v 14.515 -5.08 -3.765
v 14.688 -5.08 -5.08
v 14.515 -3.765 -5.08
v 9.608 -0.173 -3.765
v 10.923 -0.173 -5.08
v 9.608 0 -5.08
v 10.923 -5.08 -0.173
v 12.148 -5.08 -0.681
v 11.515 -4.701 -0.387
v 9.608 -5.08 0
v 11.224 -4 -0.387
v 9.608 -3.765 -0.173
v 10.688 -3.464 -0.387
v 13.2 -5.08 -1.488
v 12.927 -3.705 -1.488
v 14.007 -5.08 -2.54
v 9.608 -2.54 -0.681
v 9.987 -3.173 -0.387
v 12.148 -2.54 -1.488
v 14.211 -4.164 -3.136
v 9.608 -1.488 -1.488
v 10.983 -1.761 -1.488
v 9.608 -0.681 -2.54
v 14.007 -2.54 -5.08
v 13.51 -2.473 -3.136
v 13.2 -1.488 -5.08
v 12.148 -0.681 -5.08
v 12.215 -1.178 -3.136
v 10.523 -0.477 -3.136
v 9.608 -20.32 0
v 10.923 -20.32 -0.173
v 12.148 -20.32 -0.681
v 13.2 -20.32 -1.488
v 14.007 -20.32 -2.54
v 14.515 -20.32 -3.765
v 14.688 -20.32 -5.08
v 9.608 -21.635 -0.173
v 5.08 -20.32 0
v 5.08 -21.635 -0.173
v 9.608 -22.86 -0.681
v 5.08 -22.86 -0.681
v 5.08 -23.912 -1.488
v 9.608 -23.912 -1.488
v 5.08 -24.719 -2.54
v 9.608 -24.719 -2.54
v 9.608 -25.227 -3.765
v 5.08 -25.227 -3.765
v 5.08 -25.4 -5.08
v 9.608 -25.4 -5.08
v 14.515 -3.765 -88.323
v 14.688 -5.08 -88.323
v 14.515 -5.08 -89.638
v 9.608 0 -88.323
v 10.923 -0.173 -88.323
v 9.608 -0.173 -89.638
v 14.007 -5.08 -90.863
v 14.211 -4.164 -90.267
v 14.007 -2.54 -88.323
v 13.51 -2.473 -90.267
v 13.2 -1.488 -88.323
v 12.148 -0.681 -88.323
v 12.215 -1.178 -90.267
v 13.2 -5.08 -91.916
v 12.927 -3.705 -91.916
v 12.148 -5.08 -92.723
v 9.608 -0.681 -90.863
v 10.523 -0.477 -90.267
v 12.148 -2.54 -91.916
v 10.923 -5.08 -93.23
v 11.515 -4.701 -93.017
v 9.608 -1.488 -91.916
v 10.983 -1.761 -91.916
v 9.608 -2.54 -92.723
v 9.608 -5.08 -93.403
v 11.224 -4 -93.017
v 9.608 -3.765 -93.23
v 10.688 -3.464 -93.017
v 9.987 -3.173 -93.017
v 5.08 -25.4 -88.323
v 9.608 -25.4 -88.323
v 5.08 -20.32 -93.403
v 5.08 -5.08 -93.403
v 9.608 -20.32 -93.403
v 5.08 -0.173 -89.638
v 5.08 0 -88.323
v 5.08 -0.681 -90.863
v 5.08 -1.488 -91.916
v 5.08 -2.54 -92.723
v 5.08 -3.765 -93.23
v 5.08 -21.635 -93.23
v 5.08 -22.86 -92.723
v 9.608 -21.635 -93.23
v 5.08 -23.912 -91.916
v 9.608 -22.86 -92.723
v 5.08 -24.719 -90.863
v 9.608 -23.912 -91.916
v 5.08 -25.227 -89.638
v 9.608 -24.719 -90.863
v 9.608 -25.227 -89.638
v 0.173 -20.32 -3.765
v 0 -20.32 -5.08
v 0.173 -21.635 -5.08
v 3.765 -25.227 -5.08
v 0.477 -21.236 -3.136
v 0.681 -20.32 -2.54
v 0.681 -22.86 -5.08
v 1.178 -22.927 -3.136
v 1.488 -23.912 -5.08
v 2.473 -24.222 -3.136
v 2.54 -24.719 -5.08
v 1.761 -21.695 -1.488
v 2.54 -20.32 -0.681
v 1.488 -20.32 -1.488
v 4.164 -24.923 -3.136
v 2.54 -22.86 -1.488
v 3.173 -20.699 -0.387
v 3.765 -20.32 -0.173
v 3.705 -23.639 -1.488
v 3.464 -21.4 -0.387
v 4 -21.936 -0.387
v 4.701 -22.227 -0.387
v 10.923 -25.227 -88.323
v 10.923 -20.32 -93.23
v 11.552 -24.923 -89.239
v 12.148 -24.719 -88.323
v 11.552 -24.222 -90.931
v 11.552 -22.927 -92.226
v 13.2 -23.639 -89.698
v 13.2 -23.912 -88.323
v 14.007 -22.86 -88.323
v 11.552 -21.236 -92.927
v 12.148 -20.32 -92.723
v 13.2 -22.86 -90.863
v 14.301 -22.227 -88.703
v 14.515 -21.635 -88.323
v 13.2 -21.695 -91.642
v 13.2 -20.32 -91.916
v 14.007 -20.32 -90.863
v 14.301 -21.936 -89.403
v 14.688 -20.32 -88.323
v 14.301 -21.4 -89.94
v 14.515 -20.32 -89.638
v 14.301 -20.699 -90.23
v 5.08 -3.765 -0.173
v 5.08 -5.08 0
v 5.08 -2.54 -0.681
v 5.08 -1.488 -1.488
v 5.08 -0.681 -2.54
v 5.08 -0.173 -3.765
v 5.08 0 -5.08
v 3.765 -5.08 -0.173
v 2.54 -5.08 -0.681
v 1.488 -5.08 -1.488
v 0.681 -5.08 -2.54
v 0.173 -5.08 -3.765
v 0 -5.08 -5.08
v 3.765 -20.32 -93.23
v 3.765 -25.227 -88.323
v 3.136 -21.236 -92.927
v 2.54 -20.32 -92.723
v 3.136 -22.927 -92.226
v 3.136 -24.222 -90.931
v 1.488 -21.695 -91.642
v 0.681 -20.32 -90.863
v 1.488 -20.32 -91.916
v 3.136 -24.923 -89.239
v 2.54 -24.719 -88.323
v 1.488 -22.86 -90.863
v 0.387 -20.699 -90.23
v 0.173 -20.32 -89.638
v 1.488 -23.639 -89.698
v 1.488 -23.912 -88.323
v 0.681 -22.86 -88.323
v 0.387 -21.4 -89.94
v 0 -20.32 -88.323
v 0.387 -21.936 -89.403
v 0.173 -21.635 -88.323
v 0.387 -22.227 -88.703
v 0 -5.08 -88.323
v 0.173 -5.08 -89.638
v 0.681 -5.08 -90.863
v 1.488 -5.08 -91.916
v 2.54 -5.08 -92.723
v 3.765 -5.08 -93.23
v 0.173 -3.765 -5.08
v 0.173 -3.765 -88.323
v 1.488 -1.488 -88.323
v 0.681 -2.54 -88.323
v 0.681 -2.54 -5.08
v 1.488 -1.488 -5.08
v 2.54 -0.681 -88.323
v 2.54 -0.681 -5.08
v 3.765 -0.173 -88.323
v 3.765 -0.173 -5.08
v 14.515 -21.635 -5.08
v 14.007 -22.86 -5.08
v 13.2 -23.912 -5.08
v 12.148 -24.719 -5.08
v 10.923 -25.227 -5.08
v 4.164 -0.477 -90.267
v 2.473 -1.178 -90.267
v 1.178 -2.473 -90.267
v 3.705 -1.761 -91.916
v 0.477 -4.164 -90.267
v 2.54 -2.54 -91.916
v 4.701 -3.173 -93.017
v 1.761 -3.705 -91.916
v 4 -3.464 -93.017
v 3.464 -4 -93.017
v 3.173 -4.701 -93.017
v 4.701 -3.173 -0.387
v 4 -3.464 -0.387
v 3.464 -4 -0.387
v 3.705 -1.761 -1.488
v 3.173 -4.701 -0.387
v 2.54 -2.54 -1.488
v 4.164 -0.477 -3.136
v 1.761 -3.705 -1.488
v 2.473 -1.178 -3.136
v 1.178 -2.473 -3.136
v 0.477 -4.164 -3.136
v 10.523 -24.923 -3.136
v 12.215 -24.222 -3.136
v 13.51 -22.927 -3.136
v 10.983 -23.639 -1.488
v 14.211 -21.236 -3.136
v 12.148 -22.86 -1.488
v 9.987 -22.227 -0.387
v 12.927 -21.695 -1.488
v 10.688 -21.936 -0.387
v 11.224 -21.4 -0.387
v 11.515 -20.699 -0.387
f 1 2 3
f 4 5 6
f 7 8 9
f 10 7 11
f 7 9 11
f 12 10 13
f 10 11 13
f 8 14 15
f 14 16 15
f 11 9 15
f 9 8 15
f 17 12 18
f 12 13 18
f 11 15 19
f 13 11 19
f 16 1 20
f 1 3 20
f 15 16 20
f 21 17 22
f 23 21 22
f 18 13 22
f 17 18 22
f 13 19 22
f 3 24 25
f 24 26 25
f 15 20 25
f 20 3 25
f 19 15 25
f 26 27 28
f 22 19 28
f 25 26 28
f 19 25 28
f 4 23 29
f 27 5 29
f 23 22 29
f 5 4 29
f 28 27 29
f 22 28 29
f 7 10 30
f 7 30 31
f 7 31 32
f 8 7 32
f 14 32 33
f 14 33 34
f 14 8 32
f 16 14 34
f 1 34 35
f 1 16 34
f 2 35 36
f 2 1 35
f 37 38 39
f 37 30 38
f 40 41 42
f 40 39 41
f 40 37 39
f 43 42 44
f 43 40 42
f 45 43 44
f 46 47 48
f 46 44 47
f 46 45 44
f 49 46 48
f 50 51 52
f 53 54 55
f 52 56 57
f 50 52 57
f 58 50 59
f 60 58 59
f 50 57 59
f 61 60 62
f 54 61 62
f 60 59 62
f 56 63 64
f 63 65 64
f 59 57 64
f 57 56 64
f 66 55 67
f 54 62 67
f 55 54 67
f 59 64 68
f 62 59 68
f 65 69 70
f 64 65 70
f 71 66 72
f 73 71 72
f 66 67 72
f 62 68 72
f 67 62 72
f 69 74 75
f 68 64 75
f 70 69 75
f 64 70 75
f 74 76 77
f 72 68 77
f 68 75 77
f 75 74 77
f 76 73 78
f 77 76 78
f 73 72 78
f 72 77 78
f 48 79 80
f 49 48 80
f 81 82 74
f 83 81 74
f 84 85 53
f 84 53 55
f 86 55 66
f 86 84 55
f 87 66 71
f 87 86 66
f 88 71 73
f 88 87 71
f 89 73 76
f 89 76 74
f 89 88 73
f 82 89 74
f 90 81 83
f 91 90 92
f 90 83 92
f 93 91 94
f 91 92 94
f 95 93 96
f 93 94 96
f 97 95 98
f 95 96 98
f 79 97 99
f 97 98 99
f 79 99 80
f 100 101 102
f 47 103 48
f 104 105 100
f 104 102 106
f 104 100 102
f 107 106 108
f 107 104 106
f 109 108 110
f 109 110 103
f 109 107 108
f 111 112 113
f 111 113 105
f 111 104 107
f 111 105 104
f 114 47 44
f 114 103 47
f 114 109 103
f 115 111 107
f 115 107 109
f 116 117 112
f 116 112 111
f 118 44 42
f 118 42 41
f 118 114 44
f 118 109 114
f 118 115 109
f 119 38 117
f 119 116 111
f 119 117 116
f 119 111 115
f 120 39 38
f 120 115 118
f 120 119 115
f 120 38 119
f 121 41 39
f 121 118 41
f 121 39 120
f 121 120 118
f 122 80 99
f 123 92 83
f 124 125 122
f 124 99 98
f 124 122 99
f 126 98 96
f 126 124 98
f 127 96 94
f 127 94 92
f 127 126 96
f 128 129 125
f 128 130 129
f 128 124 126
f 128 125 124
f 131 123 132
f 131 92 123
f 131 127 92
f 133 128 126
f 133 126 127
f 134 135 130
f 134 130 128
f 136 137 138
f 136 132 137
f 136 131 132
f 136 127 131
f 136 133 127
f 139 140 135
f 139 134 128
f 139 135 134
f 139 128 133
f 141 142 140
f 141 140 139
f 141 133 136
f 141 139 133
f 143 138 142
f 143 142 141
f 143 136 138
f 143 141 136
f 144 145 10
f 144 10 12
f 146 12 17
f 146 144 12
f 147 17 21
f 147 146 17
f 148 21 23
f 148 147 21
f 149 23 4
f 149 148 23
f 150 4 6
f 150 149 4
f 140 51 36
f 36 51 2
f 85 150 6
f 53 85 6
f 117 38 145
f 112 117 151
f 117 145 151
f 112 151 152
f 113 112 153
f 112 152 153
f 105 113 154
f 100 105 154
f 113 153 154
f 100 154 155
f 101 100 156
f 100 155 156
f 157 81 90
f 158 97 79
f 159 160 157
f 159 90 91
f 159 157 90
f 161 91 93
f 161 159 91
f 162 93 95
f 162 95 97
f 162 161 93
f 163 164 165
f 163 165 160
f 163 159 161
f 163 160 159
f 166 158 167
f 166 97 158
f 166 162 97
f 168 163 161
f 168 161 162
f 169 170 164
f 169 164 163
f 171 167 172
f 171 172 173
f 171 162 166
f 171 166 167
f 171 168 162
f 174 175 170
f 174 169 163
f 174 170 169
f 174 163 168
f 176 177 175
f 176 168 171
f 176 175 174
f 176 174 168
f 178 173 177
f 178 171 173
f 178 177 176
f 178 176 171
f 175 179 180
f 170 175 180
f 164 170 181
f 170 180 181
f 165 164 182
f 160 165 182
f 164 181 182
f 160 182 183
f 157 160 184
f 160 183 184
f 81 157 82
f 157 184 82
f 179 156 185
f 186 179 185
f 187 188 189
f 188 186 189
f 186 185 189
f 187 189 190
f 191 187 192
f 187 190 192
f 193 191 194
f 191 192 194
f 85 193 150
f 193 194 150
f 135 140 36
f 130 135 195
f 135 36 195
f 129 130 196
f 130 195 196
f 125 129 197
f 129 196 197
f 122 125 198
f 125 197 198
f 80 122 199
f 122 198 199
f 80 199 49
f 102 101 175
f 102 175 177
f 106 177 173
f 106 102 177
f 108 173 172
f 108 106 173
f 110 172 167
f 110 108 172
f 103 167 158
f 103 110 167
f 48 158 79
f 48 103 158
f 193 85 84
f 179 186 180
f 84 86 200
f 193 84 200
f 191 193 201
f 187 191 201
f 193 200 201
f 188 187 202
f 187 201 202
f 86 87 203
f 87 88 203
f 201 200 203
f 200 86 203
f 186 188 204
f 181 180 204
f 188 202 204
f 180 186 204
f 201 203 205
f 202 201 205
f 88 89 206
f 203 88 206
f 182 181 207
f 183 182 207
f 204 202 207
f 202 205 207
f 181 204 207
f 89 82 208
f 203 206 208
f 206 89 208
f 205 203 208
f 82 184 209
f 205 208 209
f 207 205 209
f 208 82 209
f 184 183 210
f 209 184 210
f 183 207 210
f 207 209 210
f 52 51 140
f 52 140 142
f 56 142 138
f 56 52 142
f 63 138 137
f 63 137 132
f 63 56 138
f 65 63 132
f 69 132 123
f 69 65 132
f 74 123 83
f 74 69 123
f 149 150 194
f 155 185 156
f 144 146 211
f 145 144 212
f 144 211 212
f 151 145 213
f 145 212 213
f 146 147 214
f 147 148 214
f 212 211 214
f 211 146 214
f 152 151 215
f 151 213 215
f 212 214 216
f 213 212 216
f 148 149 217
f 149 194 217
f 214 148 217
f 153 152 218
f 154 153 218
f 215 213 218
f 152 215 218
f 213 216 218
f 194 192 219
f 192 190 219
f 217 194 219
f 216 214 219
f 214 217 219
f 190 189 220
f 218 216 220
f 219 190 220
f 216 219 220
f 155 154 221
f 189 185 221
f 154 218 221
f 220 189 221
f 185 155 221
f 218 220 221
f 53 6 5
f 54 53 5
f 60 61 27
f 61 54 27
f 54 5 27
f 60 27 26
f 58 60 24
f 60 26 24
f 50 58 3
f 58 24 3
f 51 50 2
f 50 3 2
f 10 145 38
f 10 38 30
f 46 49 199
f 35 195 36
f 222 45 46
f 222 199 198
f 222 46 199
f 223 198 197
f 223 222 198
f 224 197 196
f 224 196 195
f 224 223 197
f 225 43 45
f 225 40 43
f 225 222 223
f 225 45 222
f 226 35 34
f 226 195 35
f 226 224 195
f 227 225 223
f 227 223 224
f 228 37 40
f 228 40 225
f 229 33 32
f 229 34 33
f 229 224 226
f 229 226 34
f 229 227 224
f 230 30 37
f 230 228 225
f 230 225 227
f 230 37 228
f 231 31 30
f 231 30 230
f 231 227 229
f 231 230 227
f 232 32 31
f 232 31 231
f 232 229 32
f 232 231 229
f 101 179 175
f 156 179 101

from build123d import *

# Parameters (mm, degrees)
F0_W         = 14.6878659725
F0_H         = 93.4034362435
F1_DEPTH     = 25.4
F2_R         = 5.08
F3_R         = 5.08
F4_T1_DEPTH  = 4.5278659725
F4_T3_DEPTH  = 15.24
F4_S7_W      = 5.08
F4_S7_H      = 5.08
F4_T8_DEPTH  = 5.08
F4_S13_W     = 5.08
F4_S13_H     = 5.08
F4_T14_DEPTH = 5.08
F4_S19_W     = 5.08
F4_S19_H     = 5.08
F4_T20_DEPTH = 5.08
F4_S25_W     = 5.08
F4_S25_H     = 5.08
F4_T26_DEPTH = 5.08
F4_T30_ANGLE = 90
F4_T32_ANGLE = 90
F4_T34_ANGLE = 90
F4_T36_ANGLE = 90


# Not quite as in the source:
# - a fillet or chamfer that OpenCascade refuses, or shapes differently, is made with other operations: its cross-section is extruded or revolved along the edge and cut away or added


with BuildPart() as f1:
    # F0 (on Front) → F1 (new body)
    with BuildSketch(Plane.XZ):
        with Locations((7.3439329863, -46.7017181218)):
            Rectangle(F0_W, F0_H)
    extrude(amount=F1_DEPTH)

    # F2
    f2_edges = [f1.edges().sort_by_distance(p)[0] for p in [
        (14.687866, -25.4, -46.701718),
        (7.343933, -25.4, 0),
        (0, -25.4, -46.701718),
        (7.343933, -25.4, -93.403436),
    ]]
    fillet(f2_edges, radius=F2_R)

    # F3
    f3_edges = [f1.edges().sort_by_distance(p)[0] for p in [
        (14.687866, 0, -46.701718),
        (0, 0, -46.701718),
    ]]
    fillet(f3_edges, radius=F3_R)

    # F4: fillet of radius 5.08 on 2 edges, made by hand

    # F4_s2 → F4_t1 (cut)
    with BuildSketch(Plane.YZ.offset(5.08)):
        with BuildLine():
            ThreePointArc((0, -88.3234362435), (-1.4878975516, -91.915538692), (-5.08, -93.4034362435))
            Line((-5.08, -93.4034362435), (0, -93.4034362435))
            Line((0, -93.4034362435), (0, -88.3234362435))
        make_face()
        with BuildLine():
            ThreePointArc((-5.08, 0), (-1.4878975516, -1.4878975516), (0, -5.08))
            Line((0, -5.08), (0, 0))
            Line((0, 0), (-5.08, 0))
        make_face()
    extrude(amount=F4_T1_DEPTH, mode=Mode.SUBTRACT)

    # F4_s4 → F4_t3 (cut)
    with BuildSketch(Plane.XZ.offset(5.08)):
        with BuildLine():
            ThreePointArc((5.08, 0), (1.4878975516, -1.4878975516), (0, -5.08))
            Line((0, -5.08), (0, 0))
            Line((0, 0), (5.08, 0))
        make_face()
        with BuildLine():
            ThreePointArc((9.6078659725, 0), (13.1999684209, -1.4878975516), (14.6878659725, -5.08))
            Line((14.6878659725, -5.08), (14.6878659725, 0))
            Line((14.6878659725, 0), (9.6078659725, 0))
        make_face()
        with BuildLine():
            ThreePointArc((14.6878659725, -88.3234362435), (13.1999684209, -91.915538692), (9.6078659725, -93.4034362435))
            Line((9.6078659725, -93.4034362435), (14.6878659725, -93.4034362435))
            Line((14.6878659725, -93.4034362435), (14.6878659725, -88.3234362435))
        make_face()
        with BuildLine():
            ThreePointArc((0, -88.3234362435), (1.4878975516, -91.915538692), (5.08, -93.4034362435))
            Line((5.08, -93.4034362435), (0, -93.4034362435))
            Line((0, -93.4034362435), (0, -88.3234362435))
        make_face()
    extrude(amount=F4_T3_DEPTH, mode=Mode.SUBTRACT)


with BuildPart() as f4_tool6:
    # F4_s7 → F4_t8 (new body)
    with BuildSketch(Plane.XY.offset(-5.08)):
        with Locations((2.54, -22.86)):
            Rectangle(F4_S7_W, F4_S7_H)
    extrude(amount=F4_T8_DEPTH)

    # F4_s9 → F4_t10 (revolve, cut)
    with BuildSketch(Plane(origin=(5.08, -20.32, -5.08), x_dir=(0.7071067812, 0.7071067812, 0), z_dir=(0.7071067812, -0.7071067812, 0))):
        with BuildLine():
            ThreePointArc((0, -5.08), (5.08, 0), (0, 5.08))
            Line((0, 5.08), (0, -5.08))
        make_face()
    revolve(axis=Axis((5.08, -20.32, -5.08), (0, 0, 1)), mode=Mode.SUBTRACT)


with BuildPart() as f1_1:
    add(f1.part)

    # F4_t5: cut F4_tool6
    add(f4_tool6.part, mode=Mode.SUBTRACT)


with BuildPart() as f4_tool12:
    # F4_s13 → F4_t14 (new body)
    with BuildSketch(Plane.XY.offset(-5.08)):
        with Locations((12.1478659725, -22.86)):
            Rectangle(F4_S13_W, F4_S13_H)
    extrude(amount=F4_T14_DEPTH)

    # F4_s15 → F4_t16 (revolve, cut)
    with BuildSketch(Plane(origin=(9.6078659725, -20.32, -5.08), x_dir=(-0.7071067812, 0.7071067812, 0), z_dir=(0.7071067812, 0.7071067812, 0))):
        with BuildLine():
            ThreePointArc((0, -5.08), (5.08, 0), (0, 5.08))
            Line((0, 5.08), (0, -5.08))
        make_face()
    revolve(axis=Axis((9.6078659725, -20.32, -5.08), (0, 0, 1)), mode=Mode.SUBTRACT)


with BuildPart() as f1_2:
    add(f1_1.part)

    # F4_t11: cut F4_tool12
    add(f4_tool12.part, mode=Mode.SUBTRACT)


with BuildPart() as f4_tool18:
    # F4_s19 → F4_t20 (new body)
    with BuildSketch(Plane.YZ.offset(9.6078659725)):
        with Locations((-22.86, -90.8634362435)):
            Rectangle(F4_S19_W, F4_S19_H)
    extrude(amount=F4_T20_DEPTH)

    # F4_s21 → F4_t22 (revolve, cut)
    with BuildSketch(Plane(origin=(9.6078659725, -20.32, -88.3234362435), x_dir=(0, 0.7071067812, 0.7071067812), z_dir=(0, 0.7071067812, -0.7071067812))):
        with BuildLine():
            ThreePointArc((0, -5.08), (5.08, 0), (0, 5.08))
            Line((0, 5.08), (0, -5.08))
        make_face()
    revolve(axis=Axis((9.6078659725, -20.32, -88.3234362435), (1, 0, 0)), mode=Mode.SUBTRACT)


with BuildPart() as f1_3:
    add(f1_2.part)

    # F4_t17: cut F4_tool18
    add(f4_tool18.part, mode=Mode.SUBTRACT)


with BuildPart() as f4_tool24:
    # F4_s25 → F4_t26 (new body)
    with BuildSketch(Plane.YZ.offset(5.08)):
        with Locations((-22.86, -90.8634362435)):
            Rectangle(F4_S25_W, F4_S25_H)
    extrude(amount=-F4_T26_DEPTH)

    # F4_s27 → F4_t28 (revolve, cut)
    with BuildSketch(Plane(origin=(5.08, -20.32, -88.3234362435), x_dir=(0, 0.7071067812, 0.7071067812), z_dir=(0, -0.7071067812, 0.7071067812))):
        with BuildLine():
            ThreePointArc((0, -5.08), (5.08, 0), (0, 5.08))
            Line((0, 5.08), (0, -5.08))
        make_face()
    revolve(axis=Axis((5.08, -20.32, -88.3234362435), (-1, 0, 0)), mode=Mode.SUBTRACT)


with BuildPart() as f1_4:
    add(f1_3.part)

    # F4_t23: cut F4_tool24
    add(f4_tool24.part, mode=Mode.SUBTRACT)

    # F4_s29 → F4_t30 (revolve, cut)
    with BuildSketch(Plane.XZ.offset(5.08)):
        with BuildLine():
            ThreePointArc((9.6078659725, 0), (13.1999684209, -1.4878975516), (14.6878659725, -5.08))
            Line((14.6878659725, -5.08), (14.6878659725, 0))
            Line((14.6878659725, 0), (9.6078659725, 0))
        make_face()
    revolve(axis=Axis((9.6078659725, -5.08, 0), (0, 0, 1)), revolution_arc=F4_T30_ANGLE, mode=Mode.SUBTRACT)

    # F4_s31 → F4_t32 (revolve, cut)
    with BuildSketch(Plane.YZ.offset(5.08)):
        with BuildLine():
            ThreePointArc((-5.08, 0), (-1.4878975516, -1.4878975516), (0, -5.08))
            Line((0, -5.08), (0, 0))
            Line((0, 0), (-5.08, 0))
        make_face()
    revolve(axis=Axis((5.08, -5.08, 0), (0, 0, 1)), revolution_arc=F4_T32_ANGLE, mode=Mode.SUBTRACT)

    # F4_s33 → F4_t34 (revolve, cut)
    with BuildSketch(Plane.YZ.offset(5.08)):
        with BuildLine():
            ThreePointArc((0, -88.3234362435), (-1.4878975516, -91.915538692), (-5.08, -93.4034362435))
            Line((-5.08, -93.4034362435), (0, -93.4034362435))
            Line((0, -93.4034362435), (0, -88.3234362435))
        make_face()
    revolve(axis=Axis((5.08, -5.08, -93.4034362435), (0, 0, 1)), revolution_arc=F4_T34_ANGLE, mode=Mode.SUBTRACT)

    # F4_s35 → F4_t36 (revolve, cut)
    with BuildSketch(Plane.XZ.offset(5.08)):
        with BuildLine():
            ThreePointArc((14.6878659725, -88.3234362435), (13.1999684209, -91.915538692), (9.6078659725, -93.4034362435))
            Line((9.6078659725, -93.4034362435), (14.6878659725, -93.4034362435))
            Line((14.6878659725, -93.4034362435), (14.6878659725, -88.3234362435))
        make_face()
    revolve(axis=Axis((9.6078659725, -5.08, -93.4034362435), (0, 0, 1)), revolution_arc=F4_T36_ANGLE, mode=Mode.SUBTRACT)


solid = f1_4.part
